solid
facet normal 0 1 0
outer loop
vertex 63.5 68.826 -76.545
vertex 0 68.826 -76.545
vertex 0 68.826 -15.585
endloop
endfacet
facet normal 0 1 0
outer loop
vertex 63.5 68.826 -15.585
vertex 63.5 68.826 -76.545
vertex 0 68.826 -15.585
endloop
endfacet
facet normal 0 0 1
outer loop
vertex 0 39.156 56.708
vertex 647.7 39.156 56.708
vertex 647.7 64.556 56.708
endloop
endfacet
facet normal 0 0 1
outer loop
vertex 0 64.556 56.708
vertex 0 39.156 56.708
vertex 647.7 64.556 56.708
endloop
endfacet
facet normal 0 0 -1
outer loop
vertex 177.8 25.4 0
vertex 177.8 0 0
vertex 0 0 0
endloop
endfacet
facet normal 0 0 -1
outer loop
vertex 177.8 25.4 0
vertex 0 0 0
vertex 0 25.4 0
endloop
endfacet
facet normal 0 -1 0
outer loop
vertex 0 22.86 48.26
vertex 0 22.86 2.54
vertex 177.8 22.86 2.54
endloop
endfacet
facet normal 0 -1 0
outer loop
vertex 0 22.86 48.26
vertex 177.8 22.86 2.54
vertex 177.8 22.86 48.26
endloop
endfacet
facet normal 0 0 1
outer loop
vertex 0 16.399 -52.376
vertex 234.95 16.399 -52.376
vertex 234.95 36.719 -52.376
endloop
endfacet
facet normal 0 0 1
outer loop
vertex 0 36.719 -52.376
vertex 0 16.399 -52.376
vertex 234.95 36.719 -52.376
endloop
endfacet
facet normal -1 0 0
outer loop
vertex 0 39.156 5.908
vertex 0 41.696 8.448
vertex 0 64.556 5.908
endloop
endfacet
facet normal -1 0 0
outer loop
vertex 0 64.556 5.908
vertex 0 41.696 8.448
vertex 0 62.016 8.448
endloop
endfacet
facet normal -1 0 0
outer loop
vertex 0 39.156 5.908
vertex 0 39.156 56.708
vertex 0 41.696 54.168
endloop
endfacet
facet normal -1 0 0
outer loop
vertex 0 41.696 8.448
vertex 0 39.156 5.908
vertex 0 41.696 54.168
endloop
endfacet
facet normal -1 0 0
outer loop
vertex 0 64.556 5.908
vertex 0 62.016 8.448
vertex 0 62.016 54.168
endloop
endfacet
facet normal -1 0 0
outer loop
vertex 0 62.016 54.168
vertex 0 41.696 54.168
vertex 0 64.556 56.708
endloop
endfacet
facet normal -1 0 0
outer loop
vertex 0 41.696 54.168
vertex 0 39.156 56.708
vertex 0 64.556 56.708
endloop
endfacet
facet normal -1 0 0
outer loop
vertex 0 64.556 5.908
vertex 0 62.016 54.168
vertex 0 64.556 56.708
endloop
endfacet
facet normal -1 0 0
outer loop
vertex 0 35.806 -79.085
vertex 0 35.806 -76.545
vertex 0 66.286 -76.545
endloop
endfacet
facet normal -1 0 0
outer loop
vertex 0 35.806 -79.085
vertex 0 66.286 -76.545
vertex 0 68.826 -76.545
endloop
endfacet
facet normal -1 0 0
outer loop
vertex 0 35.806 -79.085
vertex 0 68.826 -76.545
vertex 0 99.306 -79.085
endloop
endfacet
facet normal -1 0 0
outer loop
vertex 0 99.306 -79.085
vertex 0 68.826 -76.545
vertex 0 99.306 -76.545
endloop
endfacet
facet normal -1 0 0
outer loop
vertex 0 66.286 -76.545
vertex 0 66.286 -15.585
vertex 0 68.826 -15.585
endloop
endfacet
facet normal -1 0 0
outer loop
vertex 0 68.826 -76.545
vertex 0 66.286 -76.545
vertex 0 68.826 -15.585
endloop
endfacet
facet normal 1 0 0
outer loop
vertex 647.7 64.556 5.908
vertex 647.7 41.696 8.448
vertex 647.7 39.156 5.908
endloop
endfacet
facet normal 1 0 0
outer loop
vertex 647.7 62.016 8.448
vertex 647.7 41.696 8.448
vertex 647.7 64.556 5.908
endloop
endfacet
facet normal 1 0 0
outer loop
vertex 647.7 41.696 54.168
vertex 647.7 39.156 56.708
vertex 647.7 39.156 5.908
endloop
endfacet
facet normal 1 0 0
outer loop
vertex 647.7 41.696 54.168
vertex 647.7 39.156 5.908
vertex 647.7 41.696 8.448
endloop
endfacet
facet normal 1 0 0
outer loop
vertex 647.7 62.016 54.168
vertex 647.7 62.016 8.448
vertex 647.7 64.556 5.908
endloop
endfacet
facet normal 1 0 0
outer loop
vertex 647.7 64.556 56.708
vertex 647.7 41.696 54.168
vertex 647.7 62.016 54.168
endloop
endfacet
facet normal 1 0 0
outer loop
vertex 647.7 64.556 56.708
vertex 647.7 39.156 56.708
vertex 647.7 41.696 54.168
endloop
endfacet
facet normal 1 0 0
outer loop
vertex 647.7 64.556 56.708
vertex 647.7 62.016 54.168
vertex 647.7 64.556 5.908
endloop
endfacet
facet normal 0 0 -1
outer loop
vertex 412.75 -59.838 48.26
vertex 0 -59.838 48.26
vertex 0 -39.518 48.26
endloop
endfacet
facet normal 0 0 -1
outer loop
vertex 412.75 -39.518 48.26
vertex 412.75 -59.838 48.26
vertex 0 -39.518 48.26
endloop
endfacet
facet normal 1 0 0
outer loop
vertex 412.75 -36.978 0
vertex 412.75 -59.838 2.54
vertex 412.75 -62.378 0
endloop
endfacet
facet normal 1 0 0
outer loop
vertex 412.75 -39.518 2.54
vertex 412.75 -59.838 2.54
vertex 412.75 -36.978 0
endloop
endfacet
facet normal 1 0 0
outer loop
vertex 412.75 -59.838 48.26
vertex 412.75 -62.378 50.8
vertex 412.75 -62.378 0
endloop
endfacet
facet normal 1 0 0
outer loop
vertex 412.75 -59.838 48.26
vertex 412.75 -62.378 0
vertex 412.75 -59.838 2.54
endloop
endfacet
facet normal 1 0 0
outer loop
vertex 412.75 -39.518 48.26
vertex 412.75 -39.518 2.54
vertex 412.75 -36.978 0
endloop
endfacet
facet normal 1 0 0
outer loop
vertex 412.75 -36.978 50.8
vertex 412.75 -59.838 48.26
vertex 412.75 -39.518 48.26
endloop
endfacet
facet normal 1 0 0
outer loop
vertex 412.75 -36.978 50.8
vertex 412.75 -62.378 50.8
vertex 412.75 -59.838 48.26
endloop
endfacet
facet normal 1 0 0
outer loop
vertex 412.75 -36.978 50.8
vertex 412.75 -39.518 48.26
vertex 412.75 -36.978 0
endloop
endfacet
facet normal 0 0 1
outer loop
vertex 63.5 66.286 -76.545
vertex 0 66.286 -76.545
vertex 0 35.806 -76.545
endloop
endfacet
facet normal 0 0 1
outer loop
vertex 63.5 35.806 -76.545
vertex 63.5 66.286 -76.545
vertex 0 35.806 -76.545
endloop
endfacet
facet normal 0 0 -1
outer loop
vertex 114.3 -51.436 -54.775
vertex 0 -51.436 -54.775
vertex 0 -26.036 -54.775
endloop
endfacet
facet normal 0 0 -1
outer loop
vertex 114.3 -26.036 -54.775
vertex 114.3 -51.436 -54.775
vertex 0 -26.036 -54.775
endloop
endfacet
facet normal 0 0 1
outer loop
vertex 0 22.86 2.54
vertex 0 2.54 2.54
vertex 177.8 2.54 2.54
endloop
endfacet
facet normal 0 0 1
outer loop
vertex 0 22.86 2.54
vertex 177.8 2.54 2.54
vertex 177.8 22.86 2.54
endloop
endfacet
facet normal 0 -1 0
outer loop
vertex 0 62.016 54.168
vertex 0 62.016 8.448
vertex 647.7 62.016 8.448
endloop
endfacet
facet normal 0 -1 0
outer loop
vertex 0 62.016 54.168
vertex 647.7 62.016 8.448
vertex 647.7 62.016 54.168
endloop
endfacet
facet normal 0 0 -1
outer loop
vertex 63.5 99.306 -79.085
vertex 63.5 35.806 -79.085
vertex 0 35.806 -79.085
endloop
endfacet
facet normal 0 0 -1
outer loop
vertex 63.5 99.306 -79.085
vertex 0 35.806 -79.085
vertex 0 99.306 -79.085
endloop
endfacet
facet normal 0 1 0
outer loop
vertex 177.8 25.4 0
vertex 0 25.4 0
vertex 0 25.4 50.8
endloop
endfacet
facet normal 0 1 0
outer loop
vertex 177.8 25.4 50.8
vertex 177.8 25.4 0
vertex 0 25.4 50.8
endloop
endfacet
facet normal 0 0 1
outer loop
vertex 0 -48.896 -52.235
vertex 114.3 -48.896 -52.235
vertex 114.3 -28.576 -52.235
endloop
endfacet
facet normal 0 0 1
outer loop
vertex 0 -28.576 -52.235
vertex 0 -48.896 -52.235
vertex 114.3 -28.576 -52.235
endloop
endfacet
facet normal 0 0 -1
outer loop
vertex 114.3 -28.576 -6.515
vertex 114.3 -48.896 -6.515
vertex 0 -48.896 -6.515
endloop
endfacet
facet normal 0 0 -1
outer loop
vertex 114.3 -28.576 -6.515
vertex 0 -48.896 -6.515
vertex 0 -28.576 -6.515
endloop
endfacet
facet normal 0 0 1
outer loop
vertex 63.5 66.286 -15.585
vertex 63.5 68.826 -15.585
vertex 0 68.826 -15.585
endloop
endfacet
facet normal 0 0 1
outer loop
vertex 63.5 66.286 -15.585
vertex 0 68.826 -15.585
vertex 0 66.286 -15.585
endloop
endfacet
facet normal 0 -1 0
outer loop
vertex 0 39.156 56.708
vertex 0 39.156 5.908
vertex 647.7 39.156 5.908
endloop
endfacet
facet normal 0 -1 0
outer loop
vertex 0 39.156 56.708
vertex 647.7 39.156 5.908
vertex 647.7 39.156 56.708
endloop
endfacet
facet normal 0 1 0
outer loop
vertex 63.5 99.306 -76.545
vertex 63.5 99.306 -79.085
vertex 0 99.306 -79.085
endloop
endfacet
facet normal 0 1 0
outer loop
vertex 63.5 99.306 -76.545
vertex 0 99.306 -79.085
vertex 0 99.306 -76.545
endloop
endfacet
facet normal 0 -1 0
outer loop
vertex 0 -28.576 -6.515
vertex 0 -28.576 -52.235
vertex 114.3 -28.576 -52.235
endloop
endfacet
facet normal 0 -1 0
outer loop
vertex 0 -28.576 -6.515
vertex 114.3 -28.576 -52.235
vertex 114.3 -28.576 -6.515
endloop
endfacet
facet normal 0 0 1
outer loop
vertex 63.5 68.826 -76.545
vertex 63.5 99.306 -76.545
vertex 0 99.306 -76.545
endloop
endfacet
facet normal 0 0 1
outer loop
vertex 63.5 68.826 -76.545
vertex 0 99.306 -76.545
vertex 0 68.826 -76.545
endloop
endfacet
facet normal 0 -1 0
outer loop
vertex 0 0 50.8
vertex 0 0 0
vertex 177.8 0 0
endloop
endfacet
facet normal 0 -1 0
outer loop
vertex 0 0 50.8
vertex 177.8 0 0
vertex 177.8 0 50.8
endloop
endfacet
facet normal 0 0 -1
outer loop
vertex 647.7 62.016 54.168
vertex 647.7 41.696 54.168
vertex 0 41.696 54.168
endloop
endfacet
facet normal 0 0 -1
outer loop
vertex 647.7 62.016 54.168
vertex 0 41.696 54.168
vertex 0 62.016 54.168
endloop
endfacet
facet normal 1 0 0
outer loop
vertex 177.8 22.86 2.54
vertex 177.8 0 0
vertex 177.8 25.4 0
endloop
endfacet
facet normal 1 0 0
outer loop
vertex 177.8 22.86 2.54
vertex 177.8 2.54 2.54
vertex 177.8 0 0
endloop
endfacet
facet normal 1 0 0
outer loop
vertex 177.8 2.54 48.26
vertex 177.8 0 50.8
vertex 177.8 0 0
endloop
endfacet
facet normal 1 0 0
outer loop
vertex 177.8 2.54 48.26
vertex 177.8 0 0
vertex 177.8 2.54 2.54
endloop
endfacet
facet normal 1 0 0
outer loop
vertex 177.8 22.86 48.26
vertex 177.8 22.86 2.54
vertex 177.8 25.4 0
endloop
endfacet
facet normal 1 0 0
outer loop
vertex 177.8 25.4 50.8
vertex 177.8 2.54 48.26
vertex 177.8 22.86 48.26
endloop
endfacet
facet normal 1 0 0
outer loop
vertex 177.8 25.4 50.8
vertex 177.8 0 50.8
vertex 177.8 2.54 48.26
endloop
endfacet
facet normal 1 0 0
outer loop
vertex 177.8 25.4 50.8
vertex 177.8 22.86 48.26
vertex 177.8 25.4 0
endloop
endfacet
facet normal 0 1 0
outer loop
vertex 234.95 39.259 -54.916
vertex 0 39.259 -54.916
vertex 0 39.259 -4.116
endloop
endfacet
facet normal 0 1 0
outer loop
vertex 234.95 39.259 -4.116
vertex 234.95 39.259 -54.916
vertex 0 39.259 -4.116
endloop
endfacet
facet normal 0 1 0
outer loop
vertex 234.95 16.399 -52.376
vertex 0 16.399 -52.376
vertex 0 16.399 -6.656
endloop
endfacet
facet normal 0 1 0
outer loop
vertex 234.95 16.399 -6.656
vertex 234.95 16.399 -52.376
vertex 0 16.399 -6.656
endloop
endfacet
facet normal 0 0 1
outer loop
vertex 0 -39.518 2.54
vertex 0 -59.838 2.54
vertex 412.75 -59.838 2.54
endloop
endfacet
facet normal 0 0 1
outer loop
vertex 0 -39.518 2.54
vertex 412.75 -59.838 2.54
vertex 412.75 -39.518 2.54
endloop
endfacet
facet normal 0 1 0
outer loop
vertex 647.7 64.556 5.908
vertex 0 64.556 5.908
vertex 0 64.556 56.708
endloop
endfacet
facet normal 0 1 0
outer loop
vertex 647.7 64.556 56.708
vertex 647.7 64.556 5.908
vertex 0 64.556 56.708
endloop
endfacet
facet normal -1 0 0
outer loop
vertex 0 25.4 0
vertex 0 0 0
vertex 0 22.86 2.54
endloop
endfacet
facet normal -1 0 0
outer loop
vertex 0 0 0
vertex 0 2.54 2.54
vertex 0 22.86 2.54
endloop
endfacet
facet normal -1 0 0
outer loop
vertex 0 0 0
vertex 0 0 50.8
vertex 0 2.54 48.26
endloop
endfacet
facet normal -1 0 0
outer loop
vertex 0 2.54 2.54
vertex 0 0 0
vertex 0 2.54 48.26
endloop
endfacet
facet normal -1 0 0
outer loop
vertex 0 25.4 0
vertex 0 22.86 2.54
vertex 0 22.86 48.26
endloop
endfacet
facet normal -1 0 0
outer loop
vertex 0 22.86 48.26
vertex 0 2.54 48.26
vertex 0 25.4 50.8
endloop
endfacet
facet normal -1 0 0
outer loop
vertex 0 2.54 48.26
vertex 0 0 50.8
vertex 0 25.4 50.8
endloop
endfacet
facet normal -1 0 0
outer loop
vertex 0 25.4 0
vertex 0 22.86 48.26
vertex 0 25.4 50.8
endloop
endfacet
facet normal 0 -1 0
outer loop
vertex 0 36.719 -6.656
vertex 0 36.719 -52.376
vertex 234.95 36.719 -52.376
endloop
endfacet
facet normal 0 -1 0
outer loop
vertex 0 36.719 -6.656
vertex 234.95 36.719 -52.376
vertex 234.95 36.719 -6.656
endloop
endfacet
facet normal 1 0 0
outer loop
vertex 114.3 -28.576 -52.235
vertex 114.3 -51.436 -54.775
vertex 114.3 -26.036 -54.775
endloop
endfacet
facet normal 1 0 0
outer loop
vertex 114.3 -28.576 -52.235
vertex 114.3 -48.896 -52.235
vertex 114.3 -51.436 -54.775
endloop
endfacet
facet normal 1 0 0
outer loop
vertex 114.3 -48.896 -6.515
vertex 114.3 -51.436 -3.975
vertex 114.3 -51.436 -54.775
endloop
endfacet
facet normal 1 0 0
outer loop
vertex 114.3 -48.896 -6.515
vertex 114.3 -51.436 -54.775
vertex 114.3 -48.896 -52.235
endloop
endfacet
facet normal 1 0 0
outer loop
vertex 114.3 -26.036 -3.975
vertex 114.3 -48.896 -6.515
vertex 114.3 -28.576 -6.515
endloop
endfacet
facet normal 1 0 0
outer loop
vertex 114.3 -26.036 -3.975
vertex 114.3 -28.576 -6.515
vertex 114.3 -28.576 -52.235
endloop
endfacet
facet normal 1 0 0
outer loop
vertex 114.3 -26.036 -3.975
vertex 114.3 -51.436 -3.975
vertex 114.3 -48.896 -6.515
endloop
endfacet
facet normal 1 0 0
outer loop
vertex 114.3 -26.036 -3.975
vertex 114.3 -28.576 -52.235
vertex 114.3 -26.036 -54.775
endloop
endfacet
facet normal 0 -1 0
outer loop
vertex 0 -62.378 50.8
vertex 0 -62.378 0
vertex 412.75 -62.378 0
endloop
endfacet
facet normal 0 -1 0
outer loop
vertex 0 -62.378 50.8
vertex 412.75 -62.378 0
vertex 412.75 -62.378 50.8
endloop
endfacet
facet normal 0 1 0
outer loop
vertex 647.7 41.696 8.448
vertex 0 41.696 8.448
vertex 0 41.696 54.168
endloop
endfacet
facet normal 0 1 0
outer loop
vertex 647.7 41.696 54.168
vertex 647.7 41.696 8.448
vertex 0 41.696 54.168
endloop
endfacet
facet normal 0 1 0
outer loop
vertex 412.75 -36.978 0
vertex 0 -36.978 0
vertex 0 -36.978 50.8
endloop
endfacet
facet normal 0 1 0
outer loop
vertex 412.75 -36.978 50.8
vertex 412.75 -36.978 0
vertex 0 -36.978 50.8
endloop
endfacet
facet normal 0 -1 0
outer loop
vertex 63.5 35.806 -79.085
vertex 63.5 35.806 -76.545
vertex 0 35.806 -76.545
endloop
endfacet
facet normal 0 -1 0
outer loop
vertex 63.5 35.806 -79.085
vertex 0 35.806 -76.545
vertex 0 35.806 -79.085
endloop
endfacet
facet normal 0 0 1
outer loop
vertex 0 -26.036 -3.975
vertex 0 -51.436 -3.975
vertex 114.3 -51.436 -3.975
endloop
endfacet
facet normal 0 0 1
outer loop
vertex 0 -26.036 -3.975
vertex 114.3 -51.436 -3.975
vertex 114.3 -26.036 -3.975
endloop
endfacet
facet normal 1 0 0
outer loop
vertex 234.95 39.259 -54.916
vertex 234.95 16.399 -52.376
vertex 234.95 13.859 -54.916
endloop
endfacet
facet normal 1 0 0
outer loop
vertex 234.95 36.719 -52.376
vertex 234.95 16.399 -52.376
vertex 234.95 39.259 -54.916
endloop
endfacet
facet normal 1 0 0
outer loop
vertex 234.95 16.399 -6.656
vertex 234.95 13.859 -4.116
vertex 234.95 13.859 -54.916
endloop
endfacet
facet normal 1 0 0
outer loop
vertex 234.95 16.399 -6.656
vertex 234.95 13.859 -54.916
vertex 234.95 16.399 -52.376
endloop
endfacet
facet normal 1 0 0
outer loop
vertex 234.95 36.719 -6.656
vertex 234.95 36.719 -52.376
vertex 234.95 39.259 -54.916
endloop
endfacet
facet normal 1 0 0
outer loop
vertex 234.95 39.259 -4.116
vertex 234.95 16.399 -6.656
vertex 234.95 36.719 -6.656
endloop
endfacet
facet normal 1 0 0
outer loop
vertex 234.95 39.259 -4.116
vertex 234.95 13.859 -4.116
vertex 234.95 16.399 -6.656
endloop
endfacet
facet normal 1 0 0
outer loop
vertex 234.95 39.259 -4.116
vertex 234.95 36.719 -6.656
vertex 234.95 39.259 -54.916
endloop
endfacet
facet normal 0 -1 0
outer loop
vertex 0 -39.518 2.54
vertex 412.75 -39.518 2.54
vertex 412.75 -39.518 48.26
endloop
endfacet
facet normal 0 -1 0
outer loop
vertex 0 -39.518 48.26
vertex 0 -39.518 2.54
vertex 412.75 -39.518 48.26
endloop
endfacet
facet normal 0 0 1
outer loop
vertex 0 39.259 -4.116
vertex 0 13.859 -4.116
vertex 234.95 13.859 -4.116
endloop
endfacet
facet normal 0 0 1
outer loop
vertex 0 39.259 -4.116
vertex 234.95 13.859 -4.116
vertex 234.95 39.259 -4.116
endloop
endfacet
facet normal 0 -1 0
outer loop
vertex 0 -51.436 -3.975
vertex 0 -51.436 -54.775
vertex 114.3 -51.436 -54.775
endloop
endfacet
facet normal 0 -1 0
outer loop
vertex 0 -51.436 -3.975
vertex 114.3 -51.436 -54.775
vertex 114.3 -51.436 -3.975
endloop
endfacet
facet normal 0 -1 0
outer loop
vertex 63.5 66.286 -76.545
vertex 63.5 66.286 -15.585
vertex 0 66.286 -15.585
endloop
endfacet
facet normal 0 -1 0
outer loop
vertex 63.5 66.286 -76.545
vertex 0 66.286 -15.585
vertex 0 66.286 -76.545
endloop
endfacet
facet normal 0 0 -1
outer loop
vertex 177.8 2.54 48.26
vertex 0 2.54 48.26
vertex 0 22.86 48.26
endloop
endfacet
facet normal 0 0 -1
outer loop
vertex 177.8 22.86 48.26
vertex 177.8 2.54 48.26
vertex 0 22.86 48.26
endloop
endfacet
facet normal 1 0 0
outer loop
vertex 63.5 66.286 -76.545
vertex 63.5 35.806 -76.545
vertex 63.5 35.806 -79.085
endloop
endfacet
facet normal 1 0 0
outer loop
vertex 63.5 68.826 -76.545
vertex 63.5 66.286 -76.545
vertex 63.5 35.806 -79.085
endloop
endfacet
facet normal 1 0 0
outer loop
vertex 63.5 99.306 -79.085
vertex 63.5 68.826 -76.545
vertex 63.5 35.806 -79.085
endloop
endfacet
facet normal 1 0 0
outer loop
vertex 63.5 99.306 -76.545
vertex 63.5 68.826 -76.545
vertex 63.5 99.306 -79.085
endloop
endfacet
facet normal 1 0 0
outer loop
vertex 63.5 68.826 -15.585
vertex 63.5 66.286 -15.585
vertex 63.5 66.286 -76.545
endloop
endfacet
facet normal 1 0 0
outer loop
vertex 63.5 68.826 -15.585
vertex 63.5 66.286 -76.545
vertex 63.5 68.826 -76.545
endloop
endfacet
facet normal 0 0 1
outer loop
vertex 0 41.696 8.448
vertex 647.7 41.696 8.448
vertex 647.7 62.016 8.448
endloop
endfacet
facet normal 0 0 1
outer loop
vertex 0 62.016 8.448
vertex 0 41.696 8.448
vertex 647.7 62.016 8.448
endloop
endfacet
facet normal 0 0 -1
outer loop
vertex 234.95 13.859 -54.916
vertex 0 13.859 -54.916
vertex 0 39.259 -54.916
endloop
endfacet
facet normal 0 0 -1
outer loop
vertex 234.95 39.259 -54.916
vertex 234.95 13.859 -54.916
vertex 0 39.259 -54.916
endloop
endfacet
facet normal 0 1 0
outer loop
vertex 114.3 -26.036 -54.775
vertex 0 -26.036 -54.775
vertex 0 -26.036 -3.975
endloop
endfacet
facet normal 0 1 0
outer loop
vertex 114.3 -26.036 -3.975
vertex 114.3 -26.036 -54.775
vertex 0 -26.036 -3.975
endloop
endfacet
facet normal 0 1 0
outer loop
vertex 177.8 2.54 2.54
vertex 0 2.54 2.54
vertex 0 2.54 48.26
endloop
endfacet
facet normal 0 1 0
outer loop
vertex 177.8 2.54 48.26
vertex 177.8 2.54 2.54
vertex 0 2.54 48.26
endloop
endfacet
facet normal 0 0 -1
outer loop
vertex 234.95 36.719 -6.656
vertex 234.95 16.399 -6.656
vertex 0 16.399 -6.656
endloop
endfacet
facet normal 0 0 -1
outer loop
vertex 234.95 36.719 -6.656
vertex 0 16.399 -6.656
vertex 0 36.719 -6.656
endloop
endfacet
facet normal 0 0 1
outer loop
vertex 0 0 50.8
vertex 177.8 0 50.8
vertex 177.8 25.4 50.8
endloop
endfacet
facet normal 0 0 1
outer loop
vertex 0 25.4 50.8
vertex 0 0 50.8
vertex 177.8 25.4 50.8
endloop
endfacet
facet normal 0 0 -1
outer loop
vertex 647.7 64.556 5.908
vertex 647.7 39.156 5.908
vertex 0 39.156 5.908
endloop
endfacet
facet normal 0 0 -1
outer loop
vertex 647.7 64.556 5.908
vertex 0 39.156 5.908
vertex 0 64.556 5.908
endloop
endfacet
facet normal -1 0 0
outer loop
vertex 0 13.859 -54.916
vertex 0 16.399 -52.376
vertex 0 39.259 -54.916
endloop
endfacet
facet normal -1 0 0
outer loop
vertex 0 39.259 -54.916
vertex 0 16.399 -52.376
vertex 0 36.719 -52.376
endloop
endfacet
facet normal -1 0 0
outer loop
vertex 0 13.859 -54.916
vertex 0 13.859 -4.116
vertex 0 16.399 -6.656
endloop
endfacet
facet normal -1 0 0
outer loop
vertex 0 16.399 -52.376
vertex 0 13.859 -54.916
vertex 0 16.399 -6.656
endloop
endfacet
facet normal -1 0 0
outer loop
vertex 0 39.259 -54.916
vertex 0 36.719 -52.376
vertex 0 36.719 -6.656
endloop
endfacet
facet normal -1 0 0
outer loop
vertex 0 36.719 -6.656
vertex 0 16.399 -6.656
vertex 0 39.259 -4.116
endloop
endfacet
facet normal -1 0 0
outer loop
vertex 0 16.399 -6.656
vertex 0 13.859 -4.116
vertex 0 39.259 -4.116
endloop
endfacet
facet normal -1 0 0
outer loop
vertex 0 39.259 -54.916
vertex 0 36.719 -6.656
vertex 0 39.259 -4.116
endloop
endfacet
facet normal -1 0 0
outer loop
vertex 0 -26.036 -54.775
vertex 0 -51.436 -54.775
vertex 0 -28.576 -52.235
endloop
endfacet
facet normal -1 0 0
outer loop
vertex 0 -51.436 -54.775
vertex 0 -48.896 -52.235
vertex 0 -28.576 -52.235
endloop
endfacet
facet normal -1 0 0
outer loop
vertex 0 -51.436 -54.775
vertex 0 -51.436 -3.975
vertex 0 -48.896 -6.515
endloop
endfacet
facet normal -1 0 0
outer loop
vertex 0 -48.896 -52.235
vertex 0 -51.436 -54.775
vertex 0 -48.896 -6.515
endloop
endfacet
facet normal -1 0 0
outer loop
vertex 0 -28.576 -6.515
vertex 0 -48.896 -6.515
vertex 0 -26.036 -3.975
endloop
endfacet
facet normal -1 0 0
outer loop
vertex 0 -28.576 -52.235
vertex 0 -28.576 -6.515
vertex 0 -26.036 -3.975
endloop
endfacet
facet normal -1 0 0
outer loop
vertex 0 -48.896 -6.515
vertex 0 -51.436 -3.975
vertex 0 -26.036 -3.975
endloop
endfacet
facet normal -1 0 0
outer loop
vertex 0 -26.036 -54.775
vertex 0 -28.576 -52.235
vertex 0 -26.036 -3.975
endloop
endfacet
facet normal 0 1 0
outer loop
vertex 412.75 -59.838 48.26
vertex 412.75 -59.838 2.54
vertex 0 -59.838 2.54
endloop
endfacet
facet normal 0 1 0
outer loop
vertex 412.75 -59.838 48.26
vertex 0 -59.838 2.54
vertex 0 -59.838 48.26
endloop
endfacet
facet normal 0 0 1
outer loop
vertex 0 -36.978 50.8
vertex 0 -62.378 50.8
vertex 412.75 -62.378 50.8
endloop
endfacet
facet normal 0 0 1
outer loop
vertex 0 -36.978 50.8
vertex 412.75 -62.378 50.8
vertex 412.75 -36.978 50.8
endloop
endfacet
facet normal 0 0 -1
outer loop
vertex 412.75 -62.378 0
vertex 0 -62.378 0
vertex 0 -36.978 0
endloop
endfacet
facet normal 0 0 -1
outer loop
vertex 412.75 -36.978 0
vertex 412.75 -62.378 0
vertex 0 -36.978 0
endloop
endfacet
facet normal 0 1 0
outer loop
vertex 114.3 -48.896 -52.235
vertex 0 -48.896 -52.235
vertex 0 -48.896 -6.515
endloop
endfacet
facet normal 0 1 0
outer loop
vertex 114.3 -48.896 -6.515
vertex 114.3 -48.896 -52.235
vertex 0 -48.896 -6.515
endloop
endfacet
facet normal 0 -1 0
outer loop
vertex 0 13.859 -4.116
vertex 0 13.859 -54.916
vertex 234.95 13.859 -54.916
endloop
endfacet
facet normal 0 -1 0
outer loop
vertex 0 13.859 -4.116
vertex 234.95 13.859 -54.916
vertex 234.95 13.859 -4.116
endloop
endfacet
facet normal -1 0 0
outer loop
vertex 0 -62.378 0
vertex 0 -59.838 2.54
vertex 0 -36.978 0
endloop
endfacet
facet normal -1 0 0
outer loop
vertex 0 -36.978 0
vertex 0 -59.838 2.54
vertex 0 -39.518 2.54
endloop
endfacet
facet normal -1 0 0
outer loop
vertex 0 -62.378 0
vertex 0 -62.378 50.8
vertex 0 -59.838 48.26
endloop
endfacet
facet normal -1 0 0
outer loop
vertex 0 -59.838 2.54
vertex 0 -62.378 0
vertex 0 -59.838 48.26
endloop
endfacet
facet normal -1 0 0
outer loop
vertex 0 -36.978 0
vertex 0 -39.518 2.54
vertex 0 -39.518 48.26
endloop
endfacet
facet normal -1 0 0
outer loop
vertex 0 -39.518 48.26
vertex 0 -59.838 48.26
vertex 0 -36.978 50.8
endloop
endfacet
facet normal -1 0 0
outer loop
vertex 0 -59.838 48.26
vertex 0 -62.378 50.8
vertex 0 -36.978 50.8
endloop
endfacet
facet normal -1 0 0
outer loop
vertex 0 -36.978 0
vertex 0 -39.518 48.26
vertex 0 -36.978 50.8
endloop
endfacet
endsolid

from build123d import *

# Parameters (mm, degrees)
F0_W      = 25.4
F0_H      = 50.8
F0_W_2    = 20.32
F0_H_2    = 45.72
F1_DEPTH  = 177.8
F2_W      = 25.4
F2_H      = 50.8
F2_W_2    = 20.32
F2_H_2    = 45.72
F3_DEPTH  = 412.75
F4_W      = 25.4
F4_H      = 50.8
F4_W_2    = 20.32
F4_H_2    = 45.72
F5_DEPTH  = 114.3
F6_W      = 25.4
F6_H      = 50.8
F6_W_2    = 20.32
F6_H_2    = 45.72
F7_DEPTH  = 234.95
F8_W      = 25.4
F8_H      = 50.8
F8_W_2    = 20.32
F8_H_2    = 45.72
F9_DEPTH  = 647.7
F11_DEPTH = 63.5


with BuildPart() as f1:
    # F0 (on Right) → F1 (new body)
    with BuildSketch(Plane.YZ):
        with Locations((12.7, 25.4)):
            Rectangle(F0_W, F0_H)
        with Locations((12.7, 25.4)):
            Rectangle(F0_W_2, F0_H_2, mode=Mode.SUBTRACT)
    extrude(amount=F1_DEPTH)


with BuildPart() as f3:
    # F2 (on Right) → F3 (new body)
    with BuildSketch(Plane.YZ):
        with Locations((-49.67835, 25.4)):
            Rectangle(F2_W, F2_H)
        with Locations((-49.67835, 25.4)):
            Rectangle(F2_W_2, F2_H_2, mode=Mode.SUBTRACT)
    extrude(amount=F3_DEPTH)


with BuildPart() as f5:
    # F4 (on Right) → F5 (new body)
    with BuildSketch(Plane.YZ):
        with Locations((-38.736289, -29.374658)):
            Rectangle(F4_W, F4_H)
        with Locations((-38.736289, -29.374658)):
            Rectangle(F4_W_2, F4_H_2, mode=Mode.SUBTRACT)
    extrude(amount=F5_DEPTH)


with BuildPart() as f7:
    # F6 (on Right) → F7 (new body)
    with BuildSketch(Plane.YZ):
        with Locations((26.558986, -29.516207)):
            Rectangle(F6_W, F6_H)
        with Locations((26.558986, -29.516207)):
            Rectangle(F6_W_2, F6_H_2, mode=Mode.SUBTRACT)
    extrude(amount=F7_DEPTH)


with BuildPart() as f9:
    # F8 (on Right) → F9 (new body)
    with BuildSketch(Plane.YZ):
        with Locations((51.855821, 31.308261)):
            Rectangle(F8_W, F8_H)
        with Locations((51.855821, 31.308261)):
            Rectangle(F8_W_2, F8_H_2, mode=Mode.SUBTRACT)
    extrude(amount=F9_DEPTH)


with BuildPart() as f11:
    # F10 (on Right) → F11 (new body)
    with BuildSketch(Plane.YZ):
        Polygon((66.285934, -76.544711), (35.805934, -76.544711), (35.805934, -79.084711), (99.305934, -79.084711), (99.305934, -76.544711), (68.825934, -76.544711), (68.825934, -15.584711), (66.285934, -15.584711), align=None)
    extrude(amount=F11_DEPTH)


solid = Compound([f1.part, f3.part, f5.part, f7.part, f9.part, f11.part])
